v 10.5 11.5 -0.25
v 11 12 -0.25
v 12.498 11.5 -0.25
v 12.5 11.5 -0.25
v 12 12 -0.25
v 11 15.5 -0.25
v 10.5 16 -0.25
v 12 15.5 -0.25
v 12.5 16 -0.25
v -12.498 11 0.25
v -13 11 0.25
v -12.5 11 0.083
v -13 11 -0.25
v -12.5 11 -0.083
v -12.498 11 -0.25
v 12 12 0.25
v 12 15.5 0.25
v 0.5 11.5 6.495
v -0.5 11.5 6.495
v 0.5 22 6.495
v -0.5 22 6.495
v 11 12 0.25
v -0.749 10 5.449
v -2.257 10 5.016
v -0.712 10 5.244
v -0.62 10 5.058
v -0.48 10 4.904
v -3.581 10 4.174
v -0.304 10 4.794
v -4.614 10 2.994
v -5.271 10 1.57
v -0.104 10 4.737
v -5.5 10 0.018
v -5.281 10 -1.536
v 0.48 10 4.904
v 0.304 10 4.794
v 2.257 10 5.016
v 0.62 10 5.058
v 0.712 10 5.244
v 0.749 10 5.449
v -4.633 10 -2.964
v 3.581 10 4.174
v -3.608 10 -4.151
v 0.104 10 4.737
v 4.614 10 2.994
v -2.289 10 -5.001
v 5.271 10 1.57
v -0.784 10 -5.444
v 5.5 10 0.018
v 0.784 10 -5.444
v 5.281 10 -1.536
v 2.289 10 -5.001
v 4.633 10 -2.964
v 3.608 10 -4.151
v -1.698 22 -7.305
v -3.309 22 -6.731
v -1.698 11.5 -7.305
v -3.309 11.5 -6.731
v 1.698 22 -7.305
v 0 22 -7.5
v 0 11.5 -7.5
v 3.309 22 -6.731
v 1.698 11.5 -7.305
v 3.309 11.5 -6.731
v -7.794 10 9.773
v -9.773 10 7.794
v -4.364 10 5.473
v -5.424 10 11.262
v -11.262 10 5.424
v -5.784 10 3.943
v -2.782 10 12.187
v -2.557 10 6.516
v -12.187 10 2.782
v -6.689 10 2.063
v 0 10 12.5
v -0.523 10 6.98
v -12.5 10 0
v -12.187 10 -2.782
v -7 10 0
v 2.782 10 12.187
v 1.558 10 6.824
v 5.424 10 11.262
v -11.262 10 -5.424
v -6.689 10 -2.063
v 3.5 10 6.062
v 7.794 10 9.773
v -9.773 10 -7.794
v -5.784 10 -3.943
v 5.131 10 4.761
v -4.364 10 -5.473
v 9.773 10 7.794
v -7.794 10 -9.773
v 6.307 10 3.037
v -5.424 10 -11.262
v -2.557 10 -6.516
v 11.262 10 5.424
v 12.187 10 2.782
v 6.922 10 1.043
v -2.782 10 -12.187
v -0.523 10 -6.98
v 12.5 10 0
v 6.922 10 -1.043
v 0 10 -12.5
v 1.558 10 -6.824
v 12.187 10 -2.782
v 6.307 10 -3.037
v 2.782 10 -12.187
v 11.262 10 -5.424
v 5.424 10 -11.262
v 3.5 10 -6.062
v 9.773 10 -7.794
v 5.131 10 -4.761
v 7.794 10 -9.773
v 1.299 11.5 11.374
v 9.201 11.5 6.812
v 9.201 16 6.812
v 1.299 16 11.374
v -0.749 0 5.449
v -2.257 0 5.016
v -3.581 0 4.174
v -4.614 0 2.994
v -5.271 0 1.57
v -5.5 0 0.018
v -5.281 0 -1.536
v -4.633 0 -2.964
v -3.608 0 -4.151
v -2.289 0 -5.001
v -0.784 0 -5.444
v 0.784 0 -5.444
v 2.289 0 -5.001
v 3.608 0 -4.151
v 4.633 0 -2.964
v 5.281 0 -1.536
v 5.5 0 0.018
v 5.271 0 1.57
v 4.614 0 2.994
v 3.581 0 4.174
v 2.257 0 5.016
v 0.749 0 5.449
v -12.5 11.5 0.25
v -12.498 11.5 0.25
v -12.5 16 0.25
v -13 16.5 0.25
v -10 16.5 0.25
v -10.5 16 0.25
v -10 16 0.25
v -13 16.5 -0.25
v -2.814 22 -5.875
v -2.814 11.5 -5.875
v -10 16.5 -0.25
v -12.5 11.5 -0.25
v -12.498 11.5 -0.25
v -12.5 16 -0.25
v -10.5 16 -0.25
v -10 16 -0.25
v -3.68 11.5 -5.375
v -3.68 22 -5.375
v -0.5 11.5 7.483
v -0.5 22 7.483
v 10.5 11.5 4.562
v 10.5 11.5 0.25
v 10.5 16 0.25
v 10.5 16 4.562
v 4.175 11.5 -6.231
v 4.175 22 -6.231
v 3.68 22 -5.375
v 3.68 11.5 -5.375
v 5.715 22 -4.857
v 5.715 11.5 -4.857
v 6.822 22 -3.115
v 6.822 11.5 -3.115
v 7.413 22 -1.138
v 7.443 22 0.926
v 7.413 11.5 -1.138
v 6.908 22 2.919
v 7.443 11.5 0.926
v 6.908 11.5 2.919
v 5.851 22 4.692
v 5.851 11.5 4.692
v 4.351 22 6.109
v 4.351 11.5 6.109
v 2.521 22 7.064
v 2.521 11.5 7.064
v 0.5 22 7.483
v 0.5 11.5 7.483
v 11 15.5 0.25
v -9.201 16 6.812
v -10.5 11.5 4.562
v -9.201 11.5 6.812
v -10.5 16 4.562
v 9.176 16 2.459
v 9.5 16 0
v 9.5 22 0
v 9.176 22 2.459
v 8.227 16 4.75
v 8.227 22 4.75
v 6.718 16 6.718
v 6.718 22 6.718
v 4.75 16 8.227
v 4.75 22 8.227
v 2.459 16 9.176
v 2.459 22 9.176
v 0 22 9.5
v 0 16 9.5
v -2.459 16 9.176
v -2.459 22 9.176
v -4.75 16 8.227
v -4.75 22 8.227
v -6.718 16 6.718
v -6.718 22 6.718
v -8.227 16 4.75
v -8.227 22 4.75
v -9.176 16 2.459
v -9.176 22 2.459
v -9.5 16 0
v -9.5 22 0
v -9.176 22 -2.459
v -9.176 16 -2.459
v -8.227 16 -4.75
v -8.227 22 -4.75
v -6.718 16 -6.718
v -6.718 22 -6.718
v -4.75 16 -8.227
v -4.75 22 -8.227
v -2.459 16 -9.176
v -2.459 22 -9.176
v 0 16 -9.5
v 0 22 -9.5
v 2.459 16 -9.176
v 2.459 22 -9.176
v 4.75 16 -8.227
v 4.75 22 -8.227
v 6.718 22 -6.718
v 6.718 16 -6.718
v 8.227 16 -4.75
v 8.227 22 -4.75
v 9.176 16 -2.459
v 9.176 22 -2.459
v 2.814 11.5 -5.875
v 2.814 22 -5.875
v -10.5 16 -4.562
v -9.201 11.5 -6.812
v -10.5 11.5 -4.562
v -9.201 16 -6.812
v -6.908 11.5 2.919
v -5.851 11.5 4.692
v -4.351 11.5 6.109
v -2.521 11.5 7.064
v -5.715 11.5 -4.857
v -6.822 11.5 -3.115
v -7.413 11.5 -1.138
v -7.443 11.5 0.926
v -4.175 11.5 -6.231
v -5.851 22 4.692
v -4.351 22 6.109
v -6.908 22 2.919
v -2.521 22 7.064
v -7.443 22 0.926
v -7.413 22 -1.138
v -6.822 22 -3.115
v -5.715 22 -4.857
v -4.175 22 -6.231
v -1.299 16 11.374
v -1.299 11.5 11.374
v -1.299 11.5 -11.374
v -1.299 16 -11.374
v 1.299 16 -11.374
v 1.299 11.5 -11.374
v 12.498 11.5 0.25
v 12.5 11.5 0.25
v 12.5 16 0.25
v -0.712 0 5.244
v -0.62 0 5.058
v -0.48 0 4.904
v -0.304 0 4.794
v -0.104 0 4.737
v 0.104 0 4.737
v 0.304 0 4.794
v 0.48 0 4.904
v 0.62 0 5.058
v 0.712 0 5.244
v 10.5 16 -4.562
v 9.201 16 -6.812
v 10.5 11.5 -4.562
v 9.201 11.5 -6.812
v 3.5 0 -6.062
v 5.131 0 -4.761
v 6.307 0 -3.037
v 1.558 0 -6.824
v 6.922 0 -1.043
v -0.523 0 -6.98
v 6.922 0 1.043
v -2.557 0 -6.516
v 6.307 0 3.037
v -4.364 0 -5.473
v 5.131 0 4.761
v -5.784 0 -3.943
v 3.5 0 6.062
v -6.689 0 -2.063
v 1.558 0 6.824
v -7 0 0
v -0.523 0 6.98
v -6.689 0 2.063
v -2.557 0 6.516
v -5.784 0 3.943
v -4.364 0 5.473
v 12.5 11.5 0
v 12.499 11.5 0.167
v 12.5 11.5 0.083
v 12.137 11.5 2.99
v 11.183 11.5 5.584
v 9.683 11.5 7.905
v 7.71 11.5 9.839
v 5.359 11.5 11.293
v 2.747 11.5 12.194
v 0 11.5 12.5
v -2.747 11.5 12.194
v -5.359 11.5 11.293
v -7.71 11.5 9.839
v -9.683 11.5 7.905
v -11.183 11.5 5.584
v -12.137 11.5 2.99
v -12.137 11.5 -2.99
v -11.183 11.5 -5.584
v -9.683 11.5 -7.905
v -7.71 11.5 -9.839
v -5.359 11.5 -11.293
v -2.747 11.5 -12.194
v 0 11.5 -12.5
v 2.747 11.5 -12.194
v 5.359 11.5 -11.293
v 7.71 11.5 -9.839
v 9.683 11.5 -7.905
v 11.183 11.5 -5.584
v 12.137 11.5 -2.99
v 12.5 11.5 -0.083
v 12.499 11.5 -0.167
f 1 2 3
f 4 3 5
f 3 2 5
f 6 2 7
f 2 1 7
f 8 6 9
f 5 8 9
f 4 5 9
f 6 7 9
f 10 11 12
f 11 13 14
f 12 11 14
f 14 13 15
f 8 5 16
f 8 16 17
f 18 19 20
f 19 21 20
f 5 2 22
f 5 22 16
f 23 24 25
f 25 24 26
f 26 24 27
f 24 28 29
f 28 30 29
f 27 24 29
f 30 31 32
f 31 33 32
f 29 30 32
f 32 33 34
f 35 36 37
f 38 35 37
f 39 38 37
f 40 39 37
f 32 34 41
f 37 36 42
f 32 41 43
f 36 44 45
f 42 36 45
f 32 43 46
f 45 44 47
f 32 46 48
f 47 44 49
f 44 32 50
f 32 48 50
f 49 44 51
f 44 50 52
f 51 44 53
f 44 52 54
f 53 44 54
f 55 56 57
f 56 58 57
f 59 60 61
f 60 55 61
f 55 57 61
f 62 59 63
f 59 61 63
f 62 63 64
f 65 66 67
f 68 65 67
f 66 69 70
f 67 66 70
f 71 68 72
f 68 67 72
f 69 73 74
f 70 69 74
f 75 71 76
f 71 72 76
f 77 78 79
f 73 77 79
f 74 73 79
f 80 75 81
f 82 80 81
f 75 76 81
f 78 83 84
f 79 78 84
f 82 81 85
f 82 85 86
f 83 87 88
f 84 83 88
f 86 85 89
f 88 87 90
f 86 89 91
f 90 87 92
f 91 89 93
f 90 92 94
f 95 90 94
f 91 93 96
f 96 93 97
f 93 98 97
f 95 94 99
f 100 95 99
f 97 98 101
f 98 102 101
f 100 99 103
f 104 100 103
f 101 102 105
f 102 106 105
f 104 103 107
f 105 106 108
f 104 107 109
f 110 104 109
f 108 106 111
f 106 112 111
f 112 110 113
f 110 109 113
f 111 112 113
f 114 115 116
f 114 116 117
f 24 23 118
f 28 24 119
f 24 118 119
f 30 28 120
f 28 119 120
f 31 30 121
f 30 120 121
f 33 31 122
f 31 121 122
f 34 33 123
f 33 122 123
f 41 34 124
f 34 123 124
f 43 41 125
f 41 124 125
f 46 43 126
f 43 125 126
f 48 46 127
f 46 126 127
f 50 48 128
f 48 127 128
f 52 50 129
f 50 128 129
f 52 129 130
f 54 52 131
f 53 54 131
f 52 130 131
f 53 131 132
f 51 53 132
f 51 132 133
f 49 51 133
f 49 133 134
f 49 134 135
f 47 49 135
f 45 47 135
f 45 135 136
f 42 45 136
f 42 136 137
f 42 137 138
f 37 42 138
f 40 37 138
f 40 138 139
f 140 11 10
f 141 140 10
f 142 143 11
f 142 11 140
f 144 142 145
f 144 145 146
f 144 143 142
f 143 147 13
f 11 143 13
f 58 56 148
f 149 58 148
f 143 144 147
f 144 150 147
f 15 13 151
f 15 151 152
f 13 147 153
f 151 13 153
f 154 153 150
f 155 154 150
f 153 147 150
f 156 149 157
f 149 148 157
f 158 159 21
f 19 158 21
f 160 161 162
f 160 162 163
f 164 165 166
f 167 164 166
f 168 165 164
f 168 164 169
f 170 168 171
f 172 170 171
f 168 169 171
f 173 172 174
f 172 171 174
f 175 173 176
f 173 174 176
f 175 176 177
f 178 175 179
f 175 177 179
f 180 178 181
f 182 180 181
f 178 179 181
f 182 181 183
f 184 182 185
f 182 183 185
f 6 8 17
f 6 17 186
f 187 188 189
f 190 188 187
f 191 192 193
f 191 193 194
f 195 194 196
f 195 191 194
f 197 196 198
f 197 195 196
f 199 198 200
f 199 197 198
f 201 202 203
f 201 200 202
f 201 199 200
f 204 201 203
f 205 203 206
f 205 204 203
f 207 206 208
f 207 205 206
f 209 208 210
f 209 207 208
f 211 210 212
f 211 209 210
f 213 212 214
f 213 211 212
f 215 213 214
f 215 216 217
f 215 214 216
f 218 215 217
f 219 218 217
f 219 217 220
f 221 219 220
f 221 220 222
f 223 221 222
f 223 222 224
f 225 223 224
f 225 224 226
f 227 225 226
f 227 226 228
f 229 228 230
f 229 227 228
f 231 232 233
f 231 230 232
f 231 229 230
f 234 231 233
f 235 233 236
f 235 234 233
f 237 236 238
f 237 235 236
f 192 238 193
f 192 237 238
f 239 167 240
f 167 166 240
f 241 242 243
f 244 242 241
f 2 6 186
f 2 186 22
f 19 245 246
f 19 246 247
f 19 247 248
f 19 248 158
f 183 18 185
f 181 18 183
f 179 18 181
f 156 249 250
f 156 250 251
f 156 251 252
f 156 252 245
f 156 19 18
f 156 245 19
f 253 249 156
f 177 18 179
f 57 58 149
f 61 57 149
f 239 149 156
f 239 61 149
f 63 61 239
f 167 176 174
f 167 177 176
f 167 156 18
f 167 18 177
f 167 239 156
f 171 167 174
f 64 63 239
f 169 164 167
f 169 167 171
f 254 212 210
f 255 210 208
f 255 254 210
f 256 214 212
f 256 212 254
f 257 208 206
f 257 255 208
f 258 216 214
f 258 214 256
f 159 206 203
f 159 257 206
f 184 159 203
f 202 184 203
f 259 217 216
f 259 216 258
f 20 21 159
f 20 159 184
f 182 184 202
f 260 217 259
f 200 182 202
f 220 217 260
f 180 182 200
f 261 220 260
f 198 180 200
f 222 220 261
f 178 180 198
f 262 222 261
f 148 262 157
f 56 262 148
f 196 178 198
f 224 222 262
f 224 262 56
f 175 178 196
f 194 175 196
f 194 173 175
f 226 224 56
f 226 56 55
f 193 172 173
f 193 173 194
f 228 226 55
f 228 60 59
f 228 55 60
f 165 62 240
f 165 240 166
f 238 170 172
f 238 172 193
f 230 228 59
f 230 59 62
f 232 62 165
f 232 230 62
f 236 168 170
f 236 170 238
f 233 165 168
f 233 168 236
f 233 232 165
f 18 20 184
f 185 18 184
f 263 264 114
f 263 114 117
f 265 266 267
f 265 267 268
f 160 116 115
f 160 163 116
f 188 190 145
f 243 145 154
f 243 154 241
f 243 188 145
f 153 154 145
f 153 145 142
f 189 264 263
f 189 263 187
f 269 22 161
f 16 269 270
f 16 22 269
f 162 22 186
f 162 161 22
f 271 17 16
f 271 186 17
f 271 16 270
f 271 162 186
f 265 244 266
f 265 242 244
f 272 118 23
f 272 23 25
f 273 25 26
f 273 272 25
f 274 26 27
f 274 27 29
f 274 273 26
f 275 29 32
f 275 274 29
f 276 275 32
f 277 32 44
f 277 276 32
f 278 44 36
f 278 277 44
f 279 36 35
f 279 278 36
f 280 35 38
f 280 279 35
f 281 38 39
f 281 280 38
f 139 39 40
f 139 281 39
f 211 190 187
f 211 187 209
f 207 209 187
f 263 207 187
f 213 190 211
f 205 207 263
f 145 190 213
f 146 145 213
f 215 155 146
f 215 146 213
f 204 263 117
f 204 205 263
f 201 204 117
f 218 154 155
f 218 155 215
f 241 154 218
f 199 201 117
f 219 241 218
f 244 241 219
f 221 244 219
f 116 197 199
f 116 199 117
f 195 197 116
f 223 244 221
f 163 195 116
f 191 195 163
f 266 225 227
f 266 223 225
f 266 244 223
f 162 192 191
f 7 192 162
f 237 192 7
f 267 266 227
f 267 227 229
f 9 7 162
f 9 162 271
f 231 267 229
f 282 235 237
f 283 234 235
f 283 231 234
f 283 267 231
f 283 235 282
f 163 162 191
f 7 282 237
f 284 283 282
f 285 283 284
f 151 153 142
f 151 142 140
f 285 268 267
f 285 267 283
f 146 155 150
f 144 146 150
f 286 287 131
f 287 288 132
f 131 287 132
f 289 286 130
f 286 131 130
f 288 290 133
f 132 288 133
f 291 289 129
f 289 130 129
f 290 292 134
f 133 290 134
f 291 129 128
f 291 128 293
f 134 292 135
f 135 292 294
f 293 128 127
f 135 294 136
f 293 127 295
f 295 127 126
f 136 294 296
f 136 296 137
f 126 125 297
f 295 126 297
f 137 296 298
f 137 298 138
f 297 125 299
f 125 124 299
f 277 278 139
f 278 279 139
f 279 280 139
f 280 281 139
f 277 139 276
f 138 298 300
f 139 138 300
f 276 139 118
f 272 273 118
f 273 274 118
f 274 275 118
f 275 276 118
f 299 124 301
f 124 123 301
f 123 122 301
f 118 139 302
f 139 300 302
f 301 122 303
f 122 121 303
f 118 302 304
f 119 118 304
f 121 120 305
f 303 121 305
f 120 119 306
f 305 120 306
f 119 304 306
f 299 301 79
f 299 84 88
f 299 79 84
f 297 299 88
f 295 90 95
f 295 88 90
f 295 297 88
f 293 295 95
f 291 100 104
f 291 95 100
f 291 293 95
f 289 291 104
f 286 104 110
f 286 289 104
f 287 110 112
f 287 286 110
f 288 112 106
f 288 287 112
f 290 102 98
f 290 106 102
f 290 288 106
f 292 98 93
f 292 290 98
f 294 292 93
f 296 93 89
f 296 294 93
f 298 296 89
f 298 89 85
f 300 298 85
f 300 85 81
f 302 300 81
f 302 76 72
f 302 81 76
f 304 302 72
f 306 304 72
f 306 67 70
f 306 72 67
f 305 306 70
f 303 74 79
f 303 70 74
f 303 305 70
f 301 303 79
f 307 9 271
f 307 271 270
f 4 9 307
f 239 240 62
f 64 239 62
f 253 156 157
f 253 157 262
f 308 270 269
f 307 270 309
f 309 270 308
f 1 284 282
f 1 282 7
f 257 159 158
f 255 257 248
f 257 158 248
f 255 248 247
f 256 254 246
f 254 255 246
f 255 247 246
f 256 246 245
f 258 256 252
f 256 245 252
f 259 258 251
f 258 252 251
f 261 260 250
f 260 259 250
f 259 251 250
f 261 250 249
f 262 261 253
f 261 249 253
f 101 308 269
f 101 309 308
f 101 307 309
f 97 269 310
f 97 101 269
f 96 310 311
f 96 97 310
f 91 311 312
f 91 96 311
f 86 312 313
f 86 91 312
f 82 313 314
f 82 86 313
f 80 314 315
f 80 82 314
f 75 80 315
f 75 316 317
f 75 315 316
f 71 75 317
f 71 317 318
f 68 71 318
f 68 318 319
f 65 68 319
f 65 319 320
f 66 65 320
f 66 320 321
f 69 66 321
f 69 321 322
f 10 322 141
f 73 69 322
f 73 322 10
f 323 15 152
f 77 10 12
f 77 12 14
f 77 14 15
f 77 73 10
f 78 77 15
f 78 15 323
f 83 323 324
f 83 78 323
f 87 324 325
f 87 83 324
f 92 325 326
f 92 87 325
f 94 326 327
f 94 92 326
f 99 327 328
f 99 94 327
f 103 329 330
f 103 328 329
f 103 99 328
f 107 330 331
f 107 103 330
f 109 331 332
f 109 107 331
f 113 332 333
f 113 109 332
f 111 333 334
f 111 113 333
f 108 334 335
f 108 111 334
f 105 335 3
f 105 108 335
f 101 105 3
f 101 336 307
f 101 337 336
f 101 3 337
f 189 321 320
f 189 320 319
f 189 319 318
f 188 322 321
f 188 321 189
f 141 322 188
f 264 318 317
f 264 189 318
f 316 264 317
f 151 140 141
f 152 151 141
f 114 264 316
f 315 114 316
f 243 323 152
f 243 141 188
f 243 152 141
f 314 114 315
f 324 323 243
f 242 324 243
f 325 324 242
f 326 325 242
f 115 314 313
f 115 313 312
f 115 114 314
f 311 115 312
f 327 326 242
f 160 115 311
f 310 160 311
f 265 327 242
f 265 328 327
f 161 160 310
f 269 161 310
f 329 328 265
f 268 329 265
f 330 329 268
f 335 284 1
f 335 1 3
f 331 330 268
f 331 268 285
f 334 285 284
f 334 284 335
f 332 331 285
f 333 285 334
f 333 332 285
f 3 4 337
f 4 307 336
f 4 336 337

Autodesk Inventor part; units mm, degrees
ref_plane "YZ Plane" through (0, 0, 0) normal (1, 0, 0) x (0, 1, 0)
ref_plane "XZ Plane" through (0, 0, 0) normal (0, 1, 0) x (-1, 0, 0)
ref_plane "XY Plane" through (0, 0, 0) normal (0, 0, 1) x (1, 0, 0)
sketch "Sketch1" plane through (0, 0, 0) normal (0, 1, 0) x (-1, 0, 0)
  circle A0 centre (0, 0) radius 5.5
  circle A1 centre (0, 0) radius 7
  dimension "d0" = 11
  dimension "d1" = 14
extrude "Extrusion1" add sketch "Sketch1" along normal blind 10
thread "Thread1" size "M14x1" class "6g" standard "ANSI Metric M Profile" full length
sketch "Sketch2" plane through (0, 0, 0) normal (0, -1, 0) x (1, 0, 0)
  circle A0 centre (0, 5.4798) radius 0.75
  point P0 (0, 0)
  dimension "d6" = 1.5
extrude "Extrusion2" add sketch "Sketch2" against normal blind 10
sketch "Sketch3" plane through (0, 10, 0) normal (0, 1, 0) x (1, 0, 0)
  circle A0 centre (0, 0) radius 5.5
  circle A1 centre (0, 0) radius 12.5
  dimension "d9" = 11
  dimension "d10" = 25
extrude "Extrusion3" add sketch "Sketch3" along normal blind 1.5 contours A0 | A1
sketch "Sketch4" plane through (0, 11.5, 0) normal (0, 1, 0) x (1, 0, 0)
  line L0 (10.5, -6.0622) -> (0, -12.1244)
  line L1 (0, -12.1244) -> (-10.5, -6.0622)
  line L2 (-10.5, -6.0622) -> (-10.5, 6.0622)
  line L3 (-10.5, 6.0622) -> (0, 12.1244)
  line L4 (0, 12.1244) -> (10.5, 6.0622)
  line L5 (10.5, 6.0622) -> (10.5, -6.0622)
  circle A0 centre (0, 0) radius 7.5
  dimension "d14" = 15
extrude "Extrusion4" add sketch "Sketch4" along normal blind 4.5
sketch "Sketch5" plane through (0, 16, 0) normal (0, 1, 0) x (1, 0, 0)
  circle A0 centre (0, 0) radius 7.5
  circle A1 centre (0, 0) radius 9.5
  dimension "d17" = 15
  dimension "d18" = 19
extrude "Extrusion5" add sketch "Sketch5" along normal blind 6
thread "Thread2" size "M20x1.5" class "6g" standard "ANSI Metric M Profile" full length
sketch "Sketch6" plane through (0, 22, 0) normal (0, 1, 0) x (1, 0, 0)
  line L0 (0.5, -8.4949) -> (-0.5, -8.4949)
  line L1 (-0.5, -8.4949) -> (-0.5, -6.4949)
  line L2 (-0.5, -6.4949) -> (0.5, -6.4949)
  line L3 (0.5, -6.4949) -> (0.5, -8.4949)
  line L4 (0.5, -8.4949) -> (-0.5, -6.4949) construction
  line L5 (-0.5, -8.4949) -> (0.5, -6.4949) construction
  line L6 (3.8144, 7.6068) -> (4.6804, 7.1068)
  line L7 (4.6804, 7.1068) -> (3.6804, 5.3747)
  line L8 (3.6804, 5.3747) -> (2.8144, 5.8747)
  line L9 (2.8144, 5.8747) -> (3.8144, 7.6068)
  line L10 (3.8144, 7.6068) -> (3.6804, 5.3747) construction
  line L11 (4.6804, 7.1068) -> (2.8144, 5.8747) construction
  line L12 (-4.6804, 7.1068) -> (-3.8144, 7.6068)
  line L13 (-3.8144, 7.6068) -> (-2.8144, 5.8747)
  line L14 (-2.8144, 5.8747) -> (-3.6804, 5.3747)
  line L15 (-3.6804, 5.3747) -> (-4.6804, 7.1068)
  line L16 (-4.6804, 7.1068) -> (-2.8144, 5.8747) construction
  line L17 (-3.8144, 7.6068) -> (-3.6804, 5.3747) construction
  point P0 (0, 0)
  point P1 (0, -7.4949)
  point P2 (0, 0)
  point P3 (3.7474, 6.4907)
  point P4 (-3.7474, 6.4907)
  dimension "d23" = 1
  dimension "d24" = 2
  dimension "d27" = 150
  dimension "d31" = 210
extrude "Extrusion6" add sketch "Sketch6" against normal blind 10.5
chamfer "Chamfer1" distance 1.5 angle 45 6 edges at (-10.5, 13.75, 6.0622) (-10.5, 13.75, -6.0622) (0, 13.75, 12.1244) (10.5, 13.75, 6.0622) (10.5, 13.75, -6.0622) (0, 13.75, -12.1244)
sketch "Sketch8" plane through (0, 0, 0) normal (0, 0, 1) x (1, 0, 0)
  line L0 (10.5, 16) -> (9.201, 16) projected
  line L1 (12.5, 11.5) -> (-12.5, 11.5) projected
  line L2 (10.5, 16) -> (12.5, 16)
  line L3 (12.5, 16) -> (12.5, 11.5)
  line L4 (12.5, 11.5) -> (10.5, 11.5)
  line L5 (10.5, 11.5) -> (10.5, 16)
  line L6 (-10.5, 16) -> (-10.5, 11.5) projected
  line L7 (-12.5, 11.5) -> (-10.5, 11.5)
  line L8 (-10.5, 11.5) -> (-10.5, 16)
  line L9 (-10.5, 16) -> (-12.5, 16)
  line L10 (-12.5, 16) -> (-12.5, 11.5)
  line L11 (-13, 11) -> (-10, 11)
  line L12 (-10, 11) -> (-10, 16.5)
  line L13 (-10, 16.5) -> (-13, 16.5)
  line L14 (-13, 16.5) -> (-13, 11)
  line L15 (12, 12) -> (12, 15.5)
  line L16 (12, 15.5) -> (11, 15.5)
  line L17 (11, 15.5) -> (11, 12)
  line L18 (11, 12) -> (12, 12)
  dimension "d43" = 0.5
  dimension "d44" = 0.5
extrude "Extrusion8" add sketch "Sketch8" along normal mid plane 0.5
properties part number "nut"
